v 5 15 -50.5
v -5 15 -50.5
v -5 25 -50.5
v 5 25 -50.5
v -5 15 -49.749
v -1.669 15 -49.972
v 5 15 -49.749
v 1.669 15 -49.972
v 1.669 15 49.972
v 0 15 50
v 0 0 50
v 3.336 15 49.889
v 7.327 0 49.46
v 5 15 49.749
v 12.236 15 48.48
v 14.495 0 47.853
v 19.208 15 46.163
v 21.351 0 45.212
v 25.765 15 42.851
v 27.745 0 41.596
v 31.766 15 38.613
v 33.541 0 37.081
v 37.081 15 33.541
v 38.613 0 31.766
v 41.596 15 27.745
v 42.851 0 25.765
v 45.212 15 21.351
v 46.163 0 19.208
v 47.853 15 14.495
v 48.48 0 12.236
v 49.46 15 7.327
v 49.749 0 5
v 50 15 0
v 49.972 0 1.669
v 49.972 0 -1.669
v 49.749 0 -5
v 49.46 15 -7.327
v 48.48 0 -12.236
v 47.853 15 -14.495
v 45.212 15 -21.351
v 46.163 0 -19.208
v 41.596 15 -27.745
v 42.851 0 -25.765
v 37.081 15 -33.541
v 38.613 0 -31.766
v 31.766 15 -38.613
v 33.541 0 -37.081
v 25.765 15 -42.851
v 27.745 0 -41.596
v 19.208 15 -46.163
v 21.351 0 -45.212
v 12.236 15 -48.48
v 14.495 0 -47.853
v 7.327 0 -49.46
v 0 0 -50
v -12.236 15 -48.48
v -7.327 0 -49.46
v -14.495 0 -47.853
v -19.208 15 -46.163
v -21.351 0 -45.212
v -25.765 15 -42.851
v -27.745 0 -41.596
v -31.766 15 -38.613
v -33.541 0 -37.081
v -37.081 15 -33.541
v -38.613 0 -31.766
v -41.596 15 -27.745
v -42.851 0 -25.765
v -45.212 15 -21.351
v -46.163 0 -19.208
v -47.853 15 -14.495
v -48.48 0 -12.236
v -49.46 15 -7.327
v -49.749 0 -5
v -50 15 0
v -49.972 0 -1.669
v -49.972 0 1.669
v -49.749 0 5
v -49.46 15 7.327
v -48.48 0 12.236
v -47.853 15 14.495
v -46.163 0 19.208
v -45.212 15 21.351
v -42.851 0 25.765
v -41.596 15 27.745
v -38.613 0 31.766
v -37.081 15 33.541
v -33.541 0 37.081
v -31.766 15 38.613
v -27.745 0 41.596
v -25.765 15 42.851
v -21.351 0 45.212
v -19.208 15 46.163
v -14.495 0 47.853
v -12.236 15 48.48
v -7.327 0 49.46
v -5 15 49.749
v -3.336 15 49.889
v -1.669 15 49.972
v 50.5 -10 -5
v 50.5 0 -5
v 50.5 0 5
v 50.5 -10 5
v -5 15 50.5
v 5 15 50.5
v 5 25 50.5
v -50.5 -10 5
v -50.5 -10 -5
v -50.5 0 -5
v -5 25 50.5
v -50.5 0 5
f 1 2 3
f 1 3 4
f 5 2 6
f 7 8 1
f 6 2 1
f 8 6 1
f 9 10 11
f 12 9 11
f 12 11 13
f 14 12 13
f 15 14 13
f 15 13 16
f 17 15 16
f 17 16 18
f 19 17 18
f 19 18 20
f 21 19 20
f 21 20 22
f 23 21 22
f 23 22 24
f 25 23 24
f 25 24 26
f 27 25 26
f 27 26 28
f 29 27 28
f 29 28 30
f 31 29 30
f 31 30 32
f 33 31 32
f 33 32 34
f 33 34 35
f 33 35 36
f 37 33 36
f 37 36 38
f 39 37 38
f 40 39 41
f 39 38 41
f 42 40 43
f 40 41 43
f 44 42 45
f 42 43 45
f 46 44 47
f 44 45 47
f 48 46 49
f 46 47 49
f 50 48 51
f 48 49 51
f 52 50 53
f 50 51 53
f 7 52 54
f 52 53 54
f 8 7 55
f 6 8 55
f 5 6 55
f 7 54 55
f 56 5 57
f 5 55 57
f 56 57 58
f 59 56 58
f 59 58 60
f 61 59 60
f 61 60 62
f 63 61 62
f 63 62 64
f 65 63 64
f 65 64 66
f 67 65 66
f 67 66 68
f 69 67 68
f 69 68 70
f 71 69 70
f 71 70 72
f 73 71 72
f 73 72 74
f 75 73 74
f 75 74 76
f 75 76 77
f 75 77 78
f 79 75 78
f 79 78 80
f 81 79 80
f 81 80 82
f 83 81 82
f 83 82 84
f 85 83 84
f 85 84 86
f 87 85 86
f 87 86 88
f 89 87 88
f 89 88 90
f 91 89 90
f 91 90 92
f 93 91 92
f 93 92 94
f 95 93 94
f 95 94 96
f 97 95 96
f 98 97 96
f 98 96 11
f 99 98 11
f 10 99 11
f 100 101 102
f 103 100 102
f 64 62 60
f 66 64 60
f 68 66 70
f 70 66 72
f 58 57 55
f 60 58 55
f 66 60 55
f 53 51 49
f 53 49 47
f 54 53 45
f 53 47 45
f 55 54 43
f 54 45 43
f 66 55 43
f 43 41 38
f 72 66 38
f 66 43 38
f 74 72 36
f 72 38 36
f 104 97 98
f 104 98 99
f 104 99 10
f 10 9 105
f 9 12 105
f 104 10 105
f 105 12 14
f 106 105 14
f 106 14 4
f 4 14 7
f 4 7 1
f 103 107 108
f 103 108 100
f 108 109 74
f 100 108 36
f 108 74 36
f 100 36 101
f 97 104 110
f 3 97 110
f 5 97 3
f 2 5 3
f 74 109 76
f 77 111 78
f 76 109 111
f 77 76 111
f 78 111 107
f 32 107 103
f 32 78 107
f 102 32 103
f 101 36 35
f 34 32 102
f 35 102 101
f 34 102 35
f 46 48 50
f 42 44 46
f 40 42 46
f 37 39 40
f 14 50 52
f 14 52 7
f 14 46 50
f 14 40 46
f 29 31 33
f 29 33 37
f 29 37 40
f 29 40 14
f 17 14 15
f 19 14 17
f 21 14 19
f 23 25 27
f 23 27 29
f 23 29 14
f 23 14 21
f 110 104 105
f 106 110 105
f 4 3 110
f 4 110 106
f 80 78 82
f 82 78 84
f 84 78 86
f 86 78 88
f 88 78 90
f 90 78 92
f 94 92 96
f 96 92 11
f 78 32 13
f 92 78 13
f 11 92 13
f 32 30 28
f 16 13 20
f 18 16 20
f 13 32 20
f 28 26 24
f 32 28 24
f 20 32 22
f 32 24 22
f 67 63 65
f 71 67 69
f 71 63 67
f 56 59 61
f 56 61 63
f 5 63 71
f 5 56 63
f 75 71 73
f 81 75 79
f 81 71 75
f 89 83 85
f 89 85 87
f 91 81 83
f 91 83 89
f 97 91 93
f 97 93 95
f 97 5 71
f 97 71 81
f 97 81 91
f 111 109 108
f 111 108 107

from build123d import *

# Parameters (mm, degrees)
SKETCH1_R           = 50
BOSS_EXTRUDE1_DEPTH = 15
SKETCH2_W           = 10
SKETCH2_H           = 101
BOSS_EXTRUDE2_DEPTH = 10
SKETCH3_W           = 101
SKETCH3_H           = 10
BOSS_EXTRUDE3_DEPTH = 10


with BuildPart() as part:
    # Sketch1 → Boss-Extrude1 (new body)
    with BuildSketch(Plane(origin=(0, 0, 0), x_dir=(1, 0, 0), z_dir=(0, 1, 0))):
        with Locations(Location((0, 0, 0), (0, 0, 270))):
            Circle(SKETCH1_R)
    extrude(amount=BOSS_EXTRUDE1_DEPTH)

    # Sketch2 → Boss-Extrude2 (add)
    with BuildSketch(Plane(origin=(0, 15, 0), x_dir=(1, 0, 0), z_dir=(0, 1, 0))):
        Rectangle(SKETCH2_W, SKETCH2_H)
    extrude(amount=BOSS_EXTRUDE2_DEPTH)

    # Sketch3 → Boss-Extrude3 (add)
    with BuildSketch(Plane.XZ):
        Rectangle(SKETCH3_W, SKETCH3_H)
    extrude(amount=BOSS_EXTRUDE3_DEPTH)


solid = part.part
